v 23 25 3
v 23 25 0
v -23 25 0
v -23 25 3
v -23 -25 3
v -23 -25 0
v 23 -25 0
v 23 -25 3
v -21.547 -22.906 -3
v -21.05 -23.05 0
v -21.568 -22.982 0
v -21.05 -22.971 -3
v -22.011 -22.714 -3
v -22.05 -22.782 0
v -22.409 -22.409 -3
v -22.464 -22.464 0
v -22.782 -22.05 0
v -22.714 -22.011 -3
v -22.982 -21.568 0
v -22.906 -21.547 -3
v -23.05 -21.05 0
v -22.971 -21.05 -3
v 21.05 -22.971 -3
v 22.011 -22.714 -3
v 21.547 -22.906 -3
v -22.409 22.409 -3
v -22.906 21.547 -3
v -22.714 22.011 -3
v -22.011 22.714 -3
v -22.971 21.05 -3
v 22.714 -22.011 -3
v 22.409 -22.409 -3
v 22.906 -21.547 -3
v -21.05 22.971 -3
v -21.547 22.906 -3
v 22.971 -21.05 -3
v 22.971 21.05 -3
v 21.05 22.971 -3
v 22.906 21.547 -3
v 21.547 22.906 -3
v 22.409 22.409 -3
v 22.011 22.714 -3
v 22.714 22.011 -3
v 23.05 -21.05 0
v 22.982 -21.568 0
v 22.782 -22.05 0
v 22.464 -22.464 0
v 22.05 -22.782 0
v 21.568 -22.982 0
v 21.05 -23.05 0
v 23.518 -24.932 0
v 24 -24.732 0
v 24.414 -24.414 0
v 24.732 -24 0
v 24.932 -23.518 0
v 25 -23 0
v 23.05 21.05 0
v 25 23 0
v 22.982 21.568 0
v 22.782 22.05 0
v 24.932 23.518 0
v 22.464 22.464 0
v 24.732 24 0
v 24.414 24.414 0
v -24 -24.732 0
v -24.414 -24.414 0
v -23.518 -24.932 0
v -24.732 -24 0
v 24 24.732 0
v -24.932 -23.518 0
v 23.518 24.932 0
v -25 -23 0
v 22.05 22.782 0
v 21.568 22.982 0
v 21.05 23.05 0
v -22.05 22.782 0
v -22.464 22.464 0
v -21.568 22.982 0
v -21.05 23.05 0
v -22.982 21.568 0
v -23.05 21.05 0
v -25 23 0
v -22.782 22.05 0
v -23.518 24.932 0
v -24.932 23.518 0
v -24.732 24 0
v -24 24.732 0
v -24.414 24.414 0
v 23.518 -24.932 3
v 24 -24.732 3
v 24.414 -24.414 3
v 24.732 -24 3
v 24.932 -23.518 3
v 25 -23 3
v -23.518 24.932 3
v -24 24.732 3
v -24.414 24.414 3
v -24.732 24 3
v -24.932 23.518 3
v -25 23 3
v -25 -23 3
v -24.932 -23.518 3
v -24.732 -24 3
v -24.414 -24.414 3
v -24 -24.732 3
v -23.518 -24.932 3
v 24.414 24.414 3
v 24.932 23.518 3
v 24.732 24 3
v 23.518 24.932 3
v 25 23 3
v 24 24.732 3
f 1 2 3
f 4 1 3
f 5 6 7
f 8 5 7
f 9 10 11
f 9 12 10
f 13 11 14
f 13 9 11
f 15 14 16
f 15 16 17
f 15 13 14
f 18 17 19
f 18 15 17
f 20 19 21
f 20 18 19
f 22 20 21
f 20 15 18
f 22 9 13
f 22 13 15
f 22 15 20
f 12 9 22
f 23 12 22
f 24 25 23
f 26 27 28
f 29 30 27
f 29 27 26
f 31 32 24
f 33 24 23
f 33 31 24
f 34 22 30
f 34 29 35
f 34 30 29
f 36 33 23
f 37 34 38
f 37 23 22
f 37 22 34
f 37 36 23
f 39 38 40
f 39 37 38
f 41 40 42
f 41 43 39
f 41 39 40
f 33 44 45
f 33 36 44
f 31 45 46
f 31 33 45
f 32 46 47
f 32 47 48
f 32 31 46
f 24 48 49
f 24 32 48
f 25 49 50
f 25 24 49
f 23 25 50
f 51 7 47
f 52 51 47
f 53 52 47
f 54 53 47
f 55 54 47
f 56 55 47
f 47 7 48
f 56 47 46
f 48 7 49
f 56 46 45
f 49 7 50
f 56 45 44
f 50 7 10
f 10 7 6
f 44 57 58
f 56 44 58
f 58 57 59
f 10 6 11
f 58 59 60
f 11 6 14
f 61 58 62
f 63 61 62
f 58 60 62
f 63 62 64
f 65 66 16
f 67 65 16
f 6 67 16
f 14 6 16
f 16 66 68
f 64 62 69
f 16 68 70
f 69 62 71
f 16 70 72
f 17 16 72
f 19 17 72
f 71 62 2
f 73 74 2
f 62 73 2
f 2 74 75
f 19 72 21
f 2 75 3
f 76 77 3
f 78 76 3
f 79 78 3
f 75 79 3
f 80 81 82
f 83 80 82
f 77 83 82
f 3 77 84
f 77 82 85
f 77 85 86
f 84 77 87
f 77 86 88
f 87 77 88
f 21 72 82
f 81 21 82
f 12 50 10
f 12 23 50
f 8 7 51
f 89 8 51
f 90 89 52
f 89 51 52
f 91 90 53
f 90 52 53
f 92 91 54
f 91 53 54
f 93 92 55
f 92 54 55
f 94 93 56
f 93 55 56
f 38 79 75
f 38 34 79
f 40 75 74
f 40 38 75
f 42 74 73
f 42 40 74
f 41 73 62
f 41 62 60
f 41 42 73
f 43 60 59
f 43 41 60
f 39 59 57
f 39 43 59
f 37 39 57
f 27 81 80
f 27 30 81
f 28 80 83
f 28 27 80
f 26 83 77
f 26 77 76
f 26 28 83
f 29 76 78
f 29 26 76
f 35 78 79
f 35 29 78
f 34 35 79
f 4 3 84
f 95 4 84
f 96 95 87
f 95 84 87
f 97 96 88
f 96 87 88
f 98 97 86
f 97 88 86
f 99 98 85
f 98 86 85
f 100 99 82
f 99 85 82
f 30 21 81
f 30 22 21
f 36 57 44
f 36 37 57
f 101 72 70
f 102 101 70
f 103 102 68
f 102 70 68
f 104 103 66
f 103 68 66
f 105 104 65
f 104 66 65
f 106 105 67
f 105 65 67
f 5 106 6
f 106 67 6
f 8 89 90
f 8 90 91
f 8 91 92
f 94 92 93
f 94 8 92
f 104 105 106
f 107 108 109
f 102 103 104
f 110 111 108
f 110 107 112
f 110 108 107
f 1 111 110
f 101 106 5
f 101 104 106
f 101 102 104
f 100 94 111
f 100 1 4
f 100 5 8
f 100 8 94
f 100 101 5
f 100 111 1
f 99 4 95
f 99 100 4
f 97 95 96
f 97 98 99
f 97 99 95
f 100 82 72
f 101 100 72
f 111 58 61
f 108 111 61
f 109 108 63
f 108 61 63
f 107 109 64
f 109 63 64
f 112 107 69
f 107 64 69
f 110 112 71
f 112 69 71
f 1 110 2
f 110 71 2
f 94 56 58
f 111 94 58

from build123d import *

# Parameters (mm, degrees)
BOSS_EXTRUDE1_DEPTH = 3
BOSS_EXTRUDE2_DEPTH = 3
BOSS_EXTRUDE2_TAPER = 1.5


with BuildPart() as part:
    # Sketch1 → Boss-Extrude1 (new body)
    with BuildSketch(Plane(origin=(0, 0, 0), x_dir=(0, 1, 0), z_dir=(0, 0, 1))):
        with BuildLine():
            Line((-23, -25), (23, -25))
            ThreePointArc((23, -25), (24.414213562, -24.414213562), (25, -23))
            Line((25, -23), (25, 23))
            ThreePointArc((25, 23), (24.414213562, 24.414213562), (23, 25))
            Line((23, 25), (-23, 25))
            ThreePointArc((-23, 25), (-24.414213562, 24.414213562), (-25, 23))
            Line((-25, 23), (-25, -23))
            ThreePointArc((-25, -23), (-24.414213562, -24.414213562), (-23, -25))
        make_face()
    extrude(amount=BOSS_EXTRUDE1_DEPTH)

    # Sketch2 → Boss-Extrude2 (add)
    with BuildSketch(Plane(origin=(0, 0, 0), x_dir=(1, 0, 0), z_dir=(0, 0, -1))):
        with BuildLine():
            Line((-21.05, -23.05), (21.05, -23.05))
            ThreePointArc((21.05, -23.05), (22.464213562, -22.464213562), (23.05, -21.05))
            Line((23.05, -21.05), (23.05, 21.05))
            ThreePointArc((23.05, 21.05), (22.464213562, 22.464213562), (21.05, 23.05))
            Line((21.05, 23.05), (-21.05, 23.05))
            ThreePointArc((-21.05, 23.05), (-22.464213562, 22.464213562), (-23.05, 21.05))
            Line((-23.05, 21.05), (-23.05, -21.05))
            ThreePointArc((-23.05, -21.05), (-22.464213562, -22.464213562), (-21.05, -23.05))
        make_face()
    extrude(amount=BOSS_EXTRUDE2_DEPTH, taper=BOSS_EXTRUDE2_TAPER)


solid = part.part
